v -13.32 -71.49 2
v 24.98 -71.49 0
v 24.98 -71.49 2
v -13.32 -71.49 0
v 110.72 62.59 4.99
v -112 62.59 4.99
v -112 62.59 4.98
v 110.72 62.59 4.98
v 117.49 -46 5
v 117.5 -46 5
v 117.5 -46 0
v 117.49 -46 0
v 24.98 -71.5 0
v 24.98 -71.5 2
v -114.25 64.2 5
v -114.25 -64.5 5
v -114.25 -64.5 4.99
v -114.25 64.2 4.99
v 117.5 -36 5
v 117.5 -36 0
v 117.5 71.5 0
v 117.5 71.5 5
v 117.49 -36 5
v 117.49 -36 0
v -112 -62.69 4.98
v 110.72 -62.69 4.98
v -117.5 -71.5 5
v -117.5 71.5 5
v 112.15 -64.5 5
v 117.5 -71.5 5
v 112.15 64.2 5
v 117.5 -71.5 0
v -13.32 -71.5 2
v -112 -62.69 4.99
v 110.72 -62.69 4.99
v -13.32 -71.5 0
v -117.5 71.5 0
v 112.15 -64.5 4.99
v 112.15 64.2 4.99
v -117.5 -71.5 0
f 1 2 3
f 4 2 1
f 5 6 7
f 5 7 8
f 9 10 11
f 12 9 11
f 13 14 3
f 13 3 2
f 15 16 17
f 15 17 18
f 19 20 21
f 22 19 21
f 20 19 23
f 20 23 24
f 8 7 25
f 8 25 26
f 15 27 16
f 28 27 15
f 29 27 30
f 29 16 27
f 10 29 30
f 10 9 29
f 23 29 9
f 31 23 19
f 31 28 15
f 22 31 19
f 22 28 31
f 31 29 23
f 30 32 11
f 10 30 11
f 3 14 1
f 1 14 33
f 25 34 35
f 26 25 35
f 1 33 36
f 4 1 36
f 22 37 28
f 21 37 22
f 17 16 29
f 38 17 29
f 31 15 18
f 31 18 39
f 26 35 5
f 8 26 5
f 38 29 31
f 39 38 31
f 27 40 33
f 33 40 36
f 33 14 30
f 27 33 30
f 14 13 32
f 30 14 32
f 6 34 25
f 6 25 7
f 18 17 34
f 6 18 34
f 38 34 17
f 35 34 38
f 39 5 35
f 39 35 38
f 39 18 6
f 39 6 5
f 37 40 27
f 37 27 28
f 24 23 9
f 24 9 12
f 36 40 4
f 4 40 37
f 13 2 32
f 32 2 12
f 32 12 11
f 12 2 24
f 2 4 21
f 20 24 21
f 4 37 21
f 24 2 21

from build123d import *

# Parameters (mm, degrees)
SKETCH1_W           = 235
SKETCH1_H           = 143
BOSS_EXTRUDE1_DEPTH = 5
SKETCH2_W           = 226.4
SKETCH2_H           = 128.7
CUT_EXTRUDE1_DEPTH  = 0.01
SKETCH3_W           = 222.72
SKETCH3_H           = 125.28
CUT_EXTRUDE2_DEPTH  = 0.01
SKETCH4_W           = 5
SKETCH4_H           = 10
CUT_EXTRUDE3_DEPTH  = 0.01
SKETCH5_W           = 38.3
SKETCH5_H           = 2
CUT_EXTRUDE4_DEPTH  = 0.01


with BuildPart() as part:
    # Sketch1 → Boss-Extrude1 (new body)
    with BuildSketch(Plane.XY):
        Rectangle(SKETCH1_W, SKETCH1_H)
    extrude(amount=BOSS_EXTRUDE1_DEPTH)

    # Sketch2 → Cut-Extrude1 (cut)
    with BuildSketch(Plane.XY.offset(5)):
        with Locations((-1.05, -0.15)):
            Rectangle(SKETCH2_W, SKETCH2_H)
    extrude(amount=-CUT_EXTRUDE1_DEPTH, mode=Mode.SUBTRACT)

    # Sketch3 → Cut-Extrude2 (cut)
    with BuildSketch(Plane.XY.offset(4.99)):
        with Locations((-0.64, -0.05)):
            Rectangle(SKETCH3_W, SKETCH3_H)
    extrude(amount=-CUT_EXTRUDE2_DEPTH, mode=Mode.SUBTRACT)

    # Sketch4 → Cut-Extrude3 (cut)
    with BuildSketch(Plane(origin=(117.5, 0, 0), x_dir=(0, 0, -1), z_dir=(1, 0, 0))):
        with Locations((-2.5, -41)):
            Rectangle(SKETCH4_W, SKETCH4_H)
    extrude(amount=-CUT_EXTRUDE3_DEPTH, mode=Mode.SUBTRACT)

    # Sketch5 → Cut-Extrude4 (cut)
    with BuildSketch(Plane(origin=(0, -71.5, 0), x_dir=(-1, 0, 0), z_dir=(0, -1, 0))):
        with Locations((-5.83, -1)):
            Rectangle(SKETCH5_W, SKETCH5_H)
    extrude(amount=-CUT_EXTRUDE4_DEPTH, mode=Mode.SUBTRACT)


solid = part.part
